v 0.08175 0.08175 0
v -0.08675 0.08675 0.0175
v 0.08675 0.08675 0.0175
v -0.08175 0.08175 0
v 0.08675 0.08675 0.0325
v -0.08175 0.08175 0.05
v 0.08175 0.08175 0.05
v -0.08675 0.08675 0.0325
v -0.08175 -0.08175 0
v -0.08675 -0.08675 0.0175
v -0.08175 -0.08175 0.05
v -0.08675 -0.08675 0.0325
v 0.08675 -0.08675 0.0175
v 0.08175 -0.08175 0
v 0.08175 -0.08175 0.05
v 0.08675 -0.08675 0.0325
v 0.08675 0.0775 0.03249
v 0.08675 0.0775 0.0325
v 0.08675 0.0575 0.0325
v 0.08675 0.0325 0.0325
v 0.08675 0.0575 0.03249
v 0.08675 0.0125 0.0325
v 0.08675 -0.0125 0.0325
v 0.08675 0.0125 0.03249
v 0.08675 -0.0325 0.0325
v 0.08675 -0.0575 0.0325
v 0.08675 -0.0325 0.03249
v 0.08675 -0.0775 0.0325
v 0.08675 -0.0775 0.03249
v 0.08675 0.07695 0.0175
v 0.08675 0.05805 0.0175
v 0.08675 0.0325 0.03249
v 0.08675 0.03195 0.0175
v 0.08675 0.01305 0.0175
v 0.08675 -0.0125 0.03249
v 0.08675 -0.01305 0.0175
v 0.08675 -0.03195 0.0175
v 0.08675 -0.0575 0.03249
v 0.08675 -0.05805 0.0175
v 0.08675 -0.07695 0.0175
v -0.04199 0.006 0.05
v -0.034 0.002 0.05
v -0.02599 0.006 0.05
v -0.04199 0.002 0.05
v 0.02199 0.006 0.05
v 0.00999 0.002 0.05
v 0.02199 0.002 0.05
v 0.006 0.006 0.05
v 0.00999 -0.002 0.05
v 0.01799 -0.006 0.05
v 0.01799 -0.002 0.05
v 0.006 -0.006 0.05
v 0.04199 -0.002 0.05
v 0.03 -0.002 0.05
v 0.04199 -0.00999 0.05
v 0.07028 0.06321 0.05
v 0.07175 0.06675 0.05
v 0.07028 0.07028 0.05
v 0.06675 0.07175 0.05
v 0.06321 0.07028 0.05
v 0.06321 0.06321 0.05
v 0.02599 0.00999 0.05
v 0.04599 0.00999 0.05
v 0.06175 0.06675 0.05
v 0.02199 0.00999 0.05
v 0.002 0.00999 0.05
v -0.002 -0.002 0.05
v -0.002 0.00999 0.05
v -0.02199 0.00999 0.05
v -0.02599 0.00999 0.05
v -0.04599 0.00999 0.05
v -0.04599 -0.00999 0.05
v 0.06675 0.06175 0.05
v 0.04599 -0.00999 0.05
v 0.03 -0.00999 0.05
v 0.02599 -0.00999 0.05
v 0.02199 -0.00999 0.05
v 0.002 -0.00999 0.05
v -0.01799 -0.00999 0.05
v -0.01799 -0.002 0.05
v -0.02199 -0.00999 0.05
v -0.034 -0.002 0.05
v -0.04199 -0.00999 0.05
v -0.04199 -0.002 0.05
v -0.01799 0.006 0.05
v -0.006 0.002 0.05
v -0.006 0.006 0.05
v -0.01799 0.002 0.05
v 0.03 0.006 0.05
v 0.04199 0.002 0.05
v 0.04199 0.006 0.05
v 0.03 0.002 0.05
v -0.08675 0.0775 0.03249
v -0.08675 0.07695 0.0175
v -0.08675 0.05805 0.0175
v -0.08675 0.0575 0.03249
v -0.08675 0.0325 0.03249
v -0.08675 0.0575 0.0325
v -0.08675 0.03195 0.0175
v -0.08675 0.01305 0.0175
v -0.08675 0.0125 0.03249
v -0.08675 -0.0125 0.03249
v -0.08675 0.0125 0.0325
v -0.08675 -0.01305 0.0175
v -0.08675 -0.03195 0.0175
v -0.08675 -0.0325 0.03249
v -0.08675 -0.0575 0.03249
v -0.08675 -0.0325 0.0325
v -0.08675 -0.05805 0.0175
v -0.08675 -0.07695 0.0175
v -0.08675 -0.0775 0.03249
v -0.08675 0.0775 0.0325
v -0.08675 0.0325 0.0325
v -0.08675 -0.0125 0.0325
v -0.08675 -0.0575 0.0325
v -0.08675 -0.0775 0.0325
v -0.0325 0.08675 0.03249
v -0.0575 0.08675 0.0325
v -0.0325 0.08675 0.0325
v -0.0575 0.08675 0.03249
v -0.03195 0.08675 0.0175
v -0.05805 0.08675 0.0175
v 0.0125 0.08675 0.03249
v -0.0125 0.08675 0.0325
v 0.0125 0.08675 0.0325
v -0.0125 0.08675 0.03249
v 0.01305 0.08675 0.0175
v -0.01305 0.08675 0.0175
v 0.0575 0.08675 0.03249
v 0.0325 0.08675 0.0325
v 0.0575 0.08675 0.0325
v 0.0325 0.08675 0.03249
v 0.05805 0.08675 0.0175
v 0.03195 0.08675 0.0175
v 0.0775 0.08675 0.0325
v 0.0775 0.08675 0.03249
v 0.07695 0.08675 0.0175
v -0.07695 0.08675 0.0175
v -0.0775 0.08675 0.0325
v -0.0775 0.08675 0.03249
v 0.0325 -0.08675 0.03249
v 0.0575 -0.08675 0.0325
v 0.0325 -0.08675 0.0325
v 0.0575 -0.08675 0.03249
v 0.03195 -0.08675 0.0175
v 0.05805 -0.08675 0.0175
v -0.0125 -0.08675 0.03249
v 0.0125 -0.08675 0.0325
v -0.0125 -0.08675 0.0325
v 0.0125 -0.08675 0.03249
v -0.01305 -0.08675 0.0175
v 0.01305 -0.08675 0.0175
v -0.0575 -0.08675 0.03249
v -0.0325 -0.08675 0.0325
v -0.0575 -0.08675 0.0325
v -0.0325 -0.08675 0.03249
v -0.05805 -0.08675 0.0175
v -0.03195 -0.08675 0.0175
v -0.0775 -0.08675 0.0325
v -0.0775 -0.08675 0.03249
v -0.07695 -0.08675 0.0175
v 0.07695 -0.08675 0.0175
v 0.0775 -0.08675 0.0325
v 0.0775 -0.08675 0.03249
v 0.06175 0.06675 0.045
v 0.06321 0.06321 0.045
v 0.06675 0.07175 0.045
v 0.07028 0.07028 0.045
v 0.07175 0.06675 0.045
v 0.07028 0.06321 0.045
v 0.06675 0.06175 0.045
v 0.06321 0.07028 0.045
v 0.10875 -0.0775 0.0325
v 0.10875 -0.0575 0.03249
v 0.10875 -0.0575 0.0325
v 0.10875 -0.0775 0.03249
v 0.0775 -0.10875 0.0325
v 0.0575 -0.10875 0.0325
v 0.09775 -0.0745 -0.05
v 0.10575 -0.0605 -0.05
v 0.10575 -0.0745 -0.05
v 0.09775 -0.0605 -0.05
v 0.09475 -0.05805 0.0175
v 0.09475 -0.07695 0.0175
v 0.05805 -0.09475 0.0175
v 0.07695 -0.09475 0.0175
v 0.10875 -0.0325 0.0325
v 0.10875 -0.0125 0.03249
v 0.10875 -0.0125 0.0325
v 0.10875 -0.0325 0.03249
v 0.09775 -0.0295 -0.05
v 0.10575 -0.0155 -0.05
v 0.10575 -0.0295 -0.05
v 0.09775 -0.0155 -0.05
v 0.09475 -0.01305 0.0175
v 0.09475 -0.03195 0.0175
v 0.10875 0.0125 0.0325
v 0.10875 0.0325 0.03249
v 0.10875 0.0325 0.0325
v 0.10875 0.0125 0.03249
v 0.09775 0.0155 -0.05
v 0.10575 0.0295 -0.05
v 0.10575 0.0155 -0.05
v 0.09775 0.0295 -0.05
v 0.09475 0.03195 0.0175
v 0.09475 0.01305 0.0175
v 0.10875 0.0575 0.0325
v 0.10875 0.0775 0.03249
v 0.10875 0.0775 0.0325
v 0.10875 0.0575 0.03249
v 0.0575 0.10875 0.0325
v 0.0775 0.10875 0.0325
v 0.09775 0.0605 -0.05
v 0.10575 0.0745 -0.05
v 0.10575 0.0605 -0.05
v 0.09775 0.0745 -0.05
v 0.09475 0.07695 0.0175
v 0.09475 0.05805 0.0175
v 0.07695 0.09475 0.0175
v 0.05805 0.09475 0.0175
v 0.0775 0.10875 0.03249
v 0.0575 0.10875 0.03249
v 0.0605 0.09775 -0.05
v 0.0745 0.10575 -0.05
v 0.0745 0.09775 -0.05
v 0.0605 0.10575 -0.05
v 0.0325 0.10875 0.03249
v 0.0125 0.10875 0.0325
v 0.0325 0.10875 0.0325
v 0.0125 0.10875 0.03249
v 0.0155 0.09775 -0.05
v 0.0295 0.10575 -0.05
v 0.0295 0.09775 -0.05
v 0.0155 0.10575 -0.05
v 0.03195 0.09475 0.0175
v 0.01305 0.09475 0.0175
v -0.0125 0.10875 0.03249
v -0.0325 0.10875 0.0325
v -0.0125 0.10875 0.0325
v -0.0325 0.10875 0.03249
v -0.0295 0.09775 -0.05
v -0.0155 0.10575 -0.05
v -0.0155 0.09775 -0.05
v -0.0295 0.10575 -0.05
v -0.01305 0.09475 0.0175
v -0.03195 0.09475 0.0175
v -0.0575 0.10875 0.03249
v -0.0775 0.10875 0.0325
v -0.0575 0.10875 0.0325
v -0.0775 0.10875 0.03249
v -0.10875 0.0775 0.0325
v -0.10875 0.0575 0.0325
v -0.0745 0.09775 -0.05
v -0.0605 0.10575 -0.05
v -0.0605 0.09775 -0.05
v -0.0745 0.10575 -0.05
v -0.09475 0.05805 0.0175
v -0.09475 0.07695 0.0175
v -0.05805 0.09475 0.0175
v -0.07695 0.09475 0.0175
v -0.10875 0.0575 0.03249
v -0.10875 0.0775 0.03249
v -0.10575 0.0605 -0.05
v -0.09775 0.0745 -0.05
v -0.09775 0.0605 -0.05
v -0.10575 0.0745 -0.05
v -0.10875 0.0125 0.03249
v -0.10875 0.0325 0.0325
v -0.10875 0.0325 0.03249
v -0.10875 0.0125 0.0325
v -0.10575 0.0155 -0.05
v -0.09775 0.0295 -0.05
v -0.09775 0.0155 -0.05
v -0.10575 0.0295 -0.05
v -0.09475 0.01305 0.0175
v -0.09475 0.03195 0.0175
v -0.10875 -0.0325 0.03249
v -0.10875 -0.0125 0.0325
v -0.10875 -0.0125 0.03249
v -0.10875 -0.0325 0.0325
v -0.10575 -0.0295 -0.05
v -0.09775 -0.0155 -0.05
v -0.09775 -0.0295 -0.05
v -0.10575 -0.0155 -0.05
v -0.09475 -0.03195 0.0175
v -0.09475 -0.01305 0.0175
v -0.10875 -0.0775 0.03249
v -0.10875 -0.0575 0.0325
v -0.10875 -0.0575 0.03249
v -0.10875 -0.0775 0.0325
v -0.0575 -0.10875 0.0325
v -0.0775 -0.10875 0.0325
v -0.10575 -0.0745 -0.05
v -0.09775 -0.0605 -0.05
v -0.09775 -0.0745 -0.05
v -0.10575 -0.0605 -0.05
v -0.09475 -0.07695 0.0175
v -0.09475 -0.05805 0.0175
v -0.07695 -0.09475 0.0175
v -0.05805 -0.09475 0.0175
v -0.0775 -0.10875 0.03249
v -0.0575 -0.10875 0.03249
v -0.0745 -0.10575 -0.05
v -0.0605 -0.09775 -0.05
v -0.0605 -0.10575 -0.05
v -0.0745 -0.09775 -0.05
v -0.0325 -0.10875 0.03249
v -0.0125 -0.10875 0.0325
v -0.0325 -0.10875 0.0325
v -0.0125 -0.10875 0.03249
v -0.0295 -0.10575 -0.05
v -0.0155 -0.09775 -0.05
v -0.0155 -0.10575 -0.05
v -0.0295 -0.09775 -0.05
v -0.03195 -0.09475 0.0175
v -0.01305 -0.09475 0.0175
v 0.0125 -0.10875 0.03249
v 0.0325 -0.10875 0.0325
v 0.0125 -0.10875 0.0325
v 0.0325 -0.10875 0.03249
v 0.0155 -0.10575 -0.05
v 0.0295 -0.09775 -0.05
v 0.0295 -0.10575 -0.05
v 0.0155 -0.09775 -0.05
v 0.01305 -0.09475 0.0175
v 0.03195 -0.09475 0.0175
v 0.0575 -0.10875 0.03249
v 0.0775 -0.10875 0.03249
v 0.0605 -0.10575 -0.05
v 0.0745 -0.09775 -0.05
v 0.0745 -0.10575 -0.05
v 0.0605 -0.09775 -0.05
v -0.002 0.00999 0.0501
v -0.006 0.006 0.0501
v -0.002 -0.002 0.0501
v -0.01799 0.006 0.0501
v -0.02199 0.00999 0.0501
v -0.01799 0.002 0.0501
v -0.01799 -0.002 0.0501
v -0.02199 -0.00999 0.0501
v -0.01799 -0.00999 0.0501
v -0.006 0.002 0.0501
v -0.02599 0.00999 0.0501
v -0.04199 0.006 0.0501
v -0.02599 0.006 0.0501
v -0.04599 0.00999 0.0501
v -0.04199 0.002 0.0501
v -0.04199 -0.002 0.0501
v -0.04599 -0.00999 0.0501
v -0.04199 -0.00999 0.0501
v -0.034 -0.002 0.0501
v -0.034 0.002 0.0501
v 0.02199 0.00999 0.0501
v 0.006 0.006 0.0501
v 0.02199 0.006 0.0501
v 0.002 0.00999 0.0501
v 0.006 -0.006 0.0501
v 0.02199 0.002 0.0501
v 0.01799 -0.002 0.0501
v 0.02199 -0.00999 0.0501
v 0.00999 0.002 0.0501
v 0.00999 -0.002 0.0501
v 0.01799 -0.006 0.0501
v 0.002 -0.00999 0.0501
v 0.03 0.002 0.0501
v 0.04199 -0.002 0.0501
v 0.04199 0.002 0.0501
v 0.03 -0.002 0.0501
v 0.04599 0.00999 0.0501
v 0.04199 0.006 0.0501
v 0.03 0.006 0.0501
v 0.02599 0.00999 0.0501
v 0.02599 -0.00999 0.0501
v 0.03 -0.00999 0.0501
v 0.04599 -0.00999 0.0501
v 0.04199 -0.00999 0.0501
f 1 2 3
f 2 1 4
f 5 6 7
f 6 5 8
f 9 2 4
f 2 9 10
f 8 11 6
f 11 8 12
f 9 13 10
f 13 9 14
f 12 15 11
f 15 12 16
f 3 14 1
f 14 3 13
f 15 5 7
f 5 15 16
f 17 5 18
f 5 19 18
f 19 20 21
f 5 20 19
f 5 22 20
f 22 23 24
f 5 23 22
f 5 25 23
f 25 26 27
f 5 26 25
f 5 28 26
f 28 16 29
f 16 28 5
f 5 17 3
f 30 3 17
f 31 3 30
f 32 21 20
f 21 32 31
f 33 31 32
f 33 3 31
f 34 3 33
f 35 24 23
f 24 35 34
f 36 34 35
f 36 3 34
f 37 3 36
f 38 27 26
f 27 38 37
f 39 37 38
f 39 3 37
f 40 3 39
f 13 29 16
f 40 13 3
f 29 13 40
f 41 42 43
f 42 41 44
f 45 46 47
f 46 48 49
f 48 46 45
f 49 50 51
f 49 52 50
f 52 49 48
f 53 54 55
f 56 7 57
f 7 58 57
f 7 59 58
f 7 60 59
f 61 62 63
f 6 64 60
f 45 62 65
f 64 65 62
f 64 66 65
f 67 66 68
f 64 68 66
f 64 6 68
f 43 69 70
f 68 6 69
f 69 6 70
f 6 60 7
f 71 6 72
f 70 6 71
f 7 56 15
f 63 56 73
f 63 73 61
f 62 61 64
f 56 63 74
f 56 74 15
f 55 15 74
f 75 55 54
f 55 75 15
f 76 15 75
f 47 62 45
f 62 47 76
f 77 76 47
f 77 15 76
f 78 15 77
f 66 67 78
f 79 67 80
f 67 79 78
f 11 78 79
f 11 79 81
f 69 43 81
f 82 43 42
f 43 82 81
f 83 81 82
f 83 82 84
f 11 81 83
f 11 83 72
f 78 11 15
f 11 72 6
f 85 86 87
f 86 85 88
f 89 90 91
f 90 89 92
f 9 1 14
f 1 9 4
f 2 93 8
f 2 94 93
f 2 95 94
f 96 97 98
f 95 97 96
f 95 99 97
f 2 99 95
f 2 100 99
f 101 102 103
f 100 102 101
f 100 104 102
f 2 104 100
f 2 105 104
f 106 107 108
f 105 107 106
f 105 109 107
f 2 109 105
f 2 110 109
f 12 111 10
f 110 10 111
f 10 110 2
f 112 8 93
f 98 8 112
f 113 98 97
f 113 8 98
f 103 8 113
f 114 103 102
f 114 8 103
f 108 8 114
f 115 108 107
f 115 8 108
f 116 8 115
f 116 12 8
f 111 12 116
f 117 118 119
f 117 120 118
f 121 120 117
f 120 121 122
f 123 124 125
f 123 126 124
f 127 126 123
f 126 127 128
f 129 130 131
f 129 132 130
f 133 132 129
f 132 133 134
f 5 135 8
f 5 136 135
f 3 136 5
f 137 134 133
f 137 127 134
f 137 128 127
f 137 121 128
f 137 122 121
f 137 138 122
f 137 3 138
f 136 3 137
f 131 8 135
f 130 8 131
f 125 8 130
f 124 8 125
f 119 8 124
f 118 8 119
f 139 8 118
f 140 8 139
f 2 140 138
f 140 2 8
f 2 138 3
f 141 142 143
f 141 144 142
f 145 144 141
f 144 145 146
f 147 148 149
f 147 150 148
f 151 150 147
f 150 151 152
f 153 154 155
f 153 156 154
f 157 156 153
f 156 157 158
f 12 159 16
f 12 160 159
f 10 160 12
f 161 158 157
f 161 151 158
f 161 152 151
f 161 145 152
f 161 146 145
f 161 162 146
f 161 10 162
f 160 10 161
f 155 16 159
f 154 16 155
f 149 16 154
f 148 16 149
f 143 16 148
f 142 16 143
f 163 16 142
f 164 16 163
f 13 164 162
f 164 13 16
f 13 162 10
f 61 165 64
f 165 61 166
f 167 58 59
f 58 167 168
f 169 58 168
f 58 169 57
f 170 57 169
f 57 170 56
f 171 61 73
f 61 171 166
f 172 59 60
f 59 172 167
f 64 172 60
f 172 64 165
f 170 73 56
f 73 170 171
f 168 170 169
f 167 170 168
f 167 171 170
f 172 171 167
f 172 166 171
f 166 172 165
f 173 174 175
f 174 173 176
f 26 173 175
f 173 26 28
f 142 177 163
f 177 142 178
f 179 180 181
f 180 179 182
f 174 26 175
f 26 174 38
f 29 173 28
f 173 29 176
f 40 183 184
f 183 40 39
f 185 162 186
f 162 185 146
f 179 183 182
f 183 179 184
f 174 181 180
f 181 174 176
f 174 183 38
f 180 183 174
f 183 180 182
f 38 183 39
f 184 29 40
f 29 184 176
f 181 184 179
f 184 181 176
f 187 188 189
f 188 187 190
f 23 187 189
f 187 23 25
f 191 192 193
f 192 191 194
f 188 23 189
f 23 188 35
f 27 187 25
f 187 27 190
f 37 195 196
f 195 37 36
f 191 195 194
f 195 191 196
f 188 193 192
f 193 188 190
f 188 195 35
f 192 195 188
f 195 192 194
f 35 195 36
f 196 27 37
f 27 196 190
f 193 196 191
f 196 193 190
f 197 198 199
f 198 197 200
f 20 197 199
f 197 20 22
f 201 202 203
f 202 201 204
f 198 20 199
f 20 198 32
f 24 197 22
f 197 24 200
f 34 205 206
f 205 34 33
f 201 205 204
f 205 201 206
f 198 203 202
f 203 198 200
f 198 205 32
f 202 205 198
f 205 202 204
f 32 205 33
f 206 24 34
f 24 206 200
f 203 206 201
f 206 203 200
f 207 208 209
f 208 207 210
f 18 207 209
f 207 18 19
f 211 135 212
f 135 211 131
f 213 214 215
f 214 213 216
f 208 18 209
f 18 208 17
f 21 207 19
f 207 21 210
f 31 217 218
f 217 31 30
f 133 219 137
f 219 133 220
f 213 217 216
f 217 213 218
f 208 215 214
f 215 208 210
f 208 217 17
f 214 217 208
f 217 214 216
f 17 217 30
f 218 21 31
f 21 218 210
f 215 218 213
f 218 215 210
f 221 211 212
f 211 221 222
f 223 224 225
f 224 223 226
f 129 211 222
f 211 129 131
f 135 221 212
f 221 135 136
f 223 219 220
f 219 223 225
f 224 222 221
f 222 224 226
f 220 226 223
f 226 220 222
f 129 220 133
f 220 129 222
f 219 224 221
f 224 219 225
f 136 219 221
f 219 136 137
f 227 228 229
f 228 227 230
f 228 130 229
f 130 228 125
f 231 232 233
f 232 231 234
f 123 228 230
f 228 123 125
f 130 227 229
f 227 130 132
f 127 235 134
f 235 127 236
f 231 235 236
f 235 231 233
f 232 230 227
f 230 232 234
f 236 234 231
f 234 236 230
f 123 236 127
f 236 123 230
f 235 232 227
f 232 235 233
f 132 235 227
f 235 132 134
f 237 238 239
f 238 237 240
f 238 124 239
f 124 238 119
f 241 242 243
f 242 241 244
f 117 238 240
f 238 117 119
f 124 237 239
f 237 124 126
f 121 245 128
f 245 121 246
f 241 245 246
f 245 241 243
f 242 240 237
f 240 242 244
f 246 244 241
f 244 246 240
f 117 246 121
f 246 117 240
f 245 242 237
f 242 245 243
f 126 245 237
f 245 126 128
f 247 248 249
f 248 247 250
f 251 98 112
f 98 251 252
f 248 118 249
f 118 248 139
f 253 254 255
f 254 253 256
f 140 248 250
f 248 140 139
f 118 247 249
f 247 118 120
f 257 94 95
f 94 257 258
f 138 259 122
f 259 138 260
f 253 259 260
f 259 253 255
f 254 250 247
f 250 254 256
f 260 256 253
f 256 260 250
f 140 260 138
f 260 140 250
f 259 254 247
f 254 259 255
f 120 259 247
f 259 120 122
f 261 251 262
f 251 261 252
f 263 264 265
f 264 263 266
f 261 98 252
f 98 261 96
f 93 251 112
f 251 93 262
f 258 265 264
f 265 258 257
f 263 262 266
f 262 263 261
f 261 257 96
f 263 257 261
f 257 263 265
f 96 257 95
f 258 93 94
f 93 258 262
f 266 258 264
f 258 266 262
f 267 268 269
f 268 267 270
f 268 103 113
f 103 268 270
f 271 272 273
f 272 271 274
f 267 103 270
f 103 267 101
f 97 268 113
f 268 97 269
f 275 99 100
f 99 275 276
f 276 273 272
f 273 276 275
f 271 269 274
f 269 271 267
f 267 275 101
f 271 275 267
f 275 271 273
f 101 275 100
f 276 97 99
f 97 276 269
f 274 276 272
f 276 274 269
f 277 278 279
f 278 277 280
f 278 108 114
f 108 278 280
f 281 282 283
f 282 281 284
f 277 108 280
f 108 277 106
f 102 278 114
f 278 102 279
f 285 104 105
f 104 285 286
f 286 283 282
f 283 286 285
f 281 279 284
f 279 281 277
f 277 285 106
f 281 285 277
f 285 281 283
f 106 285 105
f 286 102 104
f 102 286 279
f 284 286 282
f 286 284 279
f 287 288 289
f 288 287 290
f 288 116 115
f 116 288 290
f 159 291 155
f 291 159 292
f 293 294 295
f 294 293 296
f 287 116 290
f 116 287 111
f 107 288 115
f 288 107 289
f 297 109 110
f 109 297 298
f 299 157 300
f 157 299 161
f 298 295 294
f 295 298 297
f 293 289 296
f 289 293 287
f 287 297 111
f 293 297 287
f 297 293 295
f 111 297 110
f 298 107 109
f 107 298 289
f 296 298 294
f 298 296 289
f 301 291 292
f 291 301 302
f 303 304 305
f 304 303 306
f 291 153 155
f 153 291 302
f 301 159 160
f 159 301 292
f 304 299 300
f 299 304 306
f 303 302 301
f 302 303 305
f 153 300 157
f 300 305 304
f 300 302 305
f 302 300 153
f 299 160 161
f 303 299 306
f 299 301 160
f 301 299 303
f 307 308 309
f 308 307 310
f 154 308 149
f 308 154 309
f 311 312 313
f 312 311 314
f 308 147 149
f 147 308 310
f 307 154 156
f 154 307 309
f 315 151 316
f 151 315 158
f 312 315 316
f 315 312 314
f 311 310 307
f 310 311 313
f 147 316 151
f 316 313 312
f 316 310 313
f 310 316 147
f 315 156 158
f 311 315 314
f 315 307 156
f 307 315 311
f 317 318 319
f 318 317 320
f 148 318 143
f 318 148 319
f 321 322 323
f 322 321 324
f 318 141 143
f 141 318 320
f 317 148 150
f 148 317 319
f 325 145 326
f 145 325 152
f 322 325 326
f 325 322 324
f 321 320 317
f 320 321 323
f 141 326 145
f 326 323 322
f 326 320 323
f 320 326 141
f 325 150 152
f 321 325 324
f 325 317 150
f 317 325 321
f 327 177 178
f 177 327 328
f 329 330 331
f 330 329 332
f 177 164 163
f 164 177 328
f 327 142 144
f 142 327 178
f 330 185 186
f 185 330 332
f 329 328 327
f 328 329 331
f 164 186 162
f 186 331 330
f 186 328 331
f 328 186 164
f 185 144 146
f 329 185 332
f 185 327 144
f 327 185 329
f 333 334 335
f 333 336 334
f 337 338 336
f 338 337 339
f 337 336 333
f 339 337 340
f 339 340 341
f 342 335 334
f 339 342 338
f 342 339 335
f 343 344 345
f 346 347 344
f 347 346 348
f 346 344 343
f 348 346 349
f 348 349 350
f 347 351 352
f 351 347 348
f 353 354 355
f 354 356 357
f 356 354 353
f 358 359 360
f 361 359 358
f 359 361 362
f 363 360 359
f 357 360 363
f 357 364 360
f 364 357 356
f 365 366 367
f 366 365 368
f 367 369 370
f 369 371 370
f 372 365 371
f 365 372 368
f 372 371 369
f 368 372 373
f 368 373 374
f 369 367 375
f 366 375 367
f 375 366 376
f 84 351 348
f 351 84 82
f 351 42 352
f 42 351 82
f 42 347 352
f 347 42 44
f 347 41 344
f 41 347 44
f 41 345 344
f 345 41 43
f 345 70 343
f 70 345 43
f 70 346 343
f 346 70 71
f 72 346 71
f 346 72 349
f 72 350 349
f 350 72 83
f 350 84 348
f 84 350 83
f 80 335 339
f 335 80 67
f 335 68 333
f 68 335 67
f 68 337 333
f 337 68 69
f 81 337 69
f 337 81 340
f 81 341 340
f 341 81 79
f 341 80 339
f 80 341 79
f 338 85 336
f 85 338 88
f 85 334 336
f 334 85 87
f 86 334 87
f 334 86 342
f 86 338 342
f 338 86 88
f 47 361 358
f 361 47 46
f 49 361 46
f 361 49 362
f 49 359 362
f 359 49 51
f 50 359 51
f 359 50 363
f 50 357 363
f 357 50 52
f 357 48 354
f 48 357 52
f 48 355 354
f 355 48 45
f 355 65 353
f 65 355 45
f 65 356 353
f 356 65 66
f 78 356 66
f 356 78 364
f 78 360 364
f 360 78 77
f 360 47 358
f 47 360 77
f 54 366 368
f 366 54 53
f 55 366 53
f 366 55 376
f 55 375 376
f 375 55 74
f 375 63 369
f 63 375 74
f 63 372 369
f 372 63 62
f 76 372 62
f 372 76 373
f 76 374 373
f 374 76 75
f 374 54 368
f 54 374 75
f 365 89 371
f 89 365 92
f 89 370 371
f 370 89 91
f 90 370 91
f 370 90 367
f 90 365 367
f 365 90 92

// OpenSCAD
// file: FPGAHousing_base.scad
include <FPGA_shared.scad>;
use <FPGAHousing_paintcap.scad>;
use <PowerSymbol.scad>;
use <DataSymbol.scad>;

module FPGAHousing_chipcutout() {
  slotPinBaseOffset = (-slotPinEdgeCount-1)/2 * slotPinEdgeSpacing;
  slotPinEdgeOffset = slotSize/2 - slotPinSize/2 - slotPinEdgePad;
  union() {
    translate([0, 0, baseDepth/2 + slotBottom + slotPinDepth]) {
      cube(size=[slotSize, slotSize, baseDepth], center=true);
    }
    for(edge=[1:4]) rotate([0,0,90*edge]) {
      for(i=[1:slotPinEdgeCount]) {
        translate([
          slotPinBaseOffset + slotPinEdgeSpacing*i,
          slotPinEdgeOffset,
          slotBottom + slotPinDepth
        ]) {
          cube(size=[slotPinSize, slotPinSize, slotPinDepth*2], center=true);
        }
      }
    }
    translate([alignHoleOffset,alignHoleOffset,slotBottom + slotPinDepth])
      cylinder(h=alignHoleDepth*2, r=alignHoleRadius, center=true, $fn=alignHoleSides);
  }
}

module FPGAHousing_base() {
  middleSize = (slotSize + capSize) / 2;
  difference() {
    union() {
      translate([0,0,baseCenter])
        cube(size=[baseSize, baseSize, baseDepth], center=true);
      translate([0,0,baseTop-eps])
        cube(size=[middleSize, middleSize, capDepth*2], center=true);
    }
    translate([0,0,baseBottom])
      cube(size=[baseBackCutoutSize, baseBackCutoutSize, baseBackCutoutDepth*2], center=true);
    FPGAHousing_chipcutout();
  }
}

FPGAHousing_base();
%FPGAHousing_paintcap();
// file: Text_FPGALOGIC.scad
include <Text_shared.scad>;

module Text_FPGALOGIC() {
  Text("FPGA LOGIC");
}

Text_FPGALOGIC();
// file: DataSymbol.scad
boxSize = 0.029;
lineSize = 0.0045;
symDepth = 0.01;
vertSeparation = 0.019;
horizSeparation = 0.018;

module DataSymbol() {
  boxVertCenter = (boxSize+vertSeparation)/2;
  boxHorizCenter = (boxSize+horizSeparation)/2;
  linear_extrude(symDepth, center=true) {
    translate([0,boxVertCenter]) square(boxSize, center=true); // top box
    translate([-boxHorizCenter,-boxVertCenter]) square(boxSize, center=true); // bottom left box
    translate([boxHorizCenter,-boxVertCenter]) square(boxSize, center=true); // bottom right box
    square([2*boxHorizCenter + lineSize, lineSize], center=true); // middle line
    translate([0, horizSeparation/4]) square([lineSize, horizSeparation/2 + lineSize], center=true); // line to top
    translate([-boxHorizCenter, -horizSeparation/4]) square([lineSize, horizSeparation/2 + lineSize], center=true); // line to bottom left
    translate([boxHorizCenter, -horizSeparation/4]) square([lineSize, horizSeparation/2 + lineSize], center=true); // line to bottom right
  }
}

DataSymbol();
// file: PowerSymbol.scad
symWidth = 0.038;
symHeight = 0.086;
symDepth = 0.01;
middleHeight = 0.0075;
topHorizOffset = 0.007;
sideVertOffset = 0.007;

module PowerSymbol() {
  linear_extrude(symDepth, center=true) {
    halfHei = symHeight/2;
    halfWid = symWidth/2;
    halfMid = middleHeight/2;
    polygon([
      [topHorizOffset, halfHei],
      [0, halfMid],
      [halfWid, sideVertOffset],
      [-topHorizOffset, -halfHei],
      [0, -halfMid],
      [-halfWid, -sideVertOffset]
    ]);
  }
}

PowerSymbol();
// file: FPGAHousing_pins.scad
include <FPGA_shared.scad>;
use <FPGAHousing_base.scad>;
use <FPGAHousing_paintcap.scad>;

module FPGAHousing_pins() {
  pinStartOffset = -(decoPinCount+1)/2 * decoPinSpacing;
  bevelSize = decoPinBevelSize * sqrt(2);

  for (edge=[0:3]) rotate([0,0,90*edge]) {
    for (pin=[1:decoPinCount]) translate([capSize/2, pinStartOffset+pin*decoPinSpacing, baseTop]) {
      difference() {
        cube(size=[decoPinLength*2, decoPinWidth, decoPinHeight*2], center=true);
        translate([decoPinLength,0,decoPinHeight]) rotate([0,45,0]) {
          cube(size=[bevelSize,decoPinWidth*2,bevelSize],center=true);
        }
      }
    }
  }
}

FPGAHousing_pins();
%FPGAHousing_base();
%FPGAHousing_paintcap();
// file: FPGAHousing_paintcap.scad
include <FPGA_shared.scad>;
use <FPGAHousing_base.scad>;

module FPGAHousing_paintcap() {
  bevelDepth = capBevel * sqrt(2);
  difference() {
    translate([0,0,baseTop]) {
      cube(size=[capSize, capSize, capDepth*2], center=true);
    }
    cube(size=[slotSize+eps*10, slotSize+eps*10, smallGridSize], center=true);
    for (edge=[1:4]) rotate([0,0,90*edge]) {
      translate([0,capSize/2,baseTop+capDepth]) rotate([45,0,0])
        cube(size=[capSize+0.1, bevelDepth, bevelDepth*2], center=true);
    }
  }
}

%FPGAHousing_base();
FPGAHousing_paintcap();
// file: FPGAHousing_logicbase.scad
include <FPGA_shared.scad>;
use <FPGAHousing_base.scad>;
use <FPGAHousing_paintcap.scad>;
use <PowerSymbol.scad>;
use <DataSymbol.scad>;

module FPGAHousing_logicbase() {
  difference() {
    FPGAHousing_base();
    cablecutout();
    rotate([0,0,180]) cablecutout();
  }
}

FPGAHousing_logicbase();
%FPGAHousing_paintcap();
%translate([0.067,0.25,-0.001]) rotate([-90, 0, 0]) PowerSymbol();
%translate([0.073,-0.25,0.001]) rotate([90, 0, 0]) DataSymbol();
// file: Text_shared.scad
char_depth = 0.0001;

char_pixelsz = 0.02/5;
char_pheight = 5;
char_max_pwidth = 5;

function sum(list) = list * [for (_=list) 1];
function partialsum(list, end) = list * [for (i=[0:len(list)-1]) i < end ? 1 : 0];

module _Text_Line(a, b) {
  l = norm(b-a);
  f = l > 0 ? (b-a)/l : [1, 0];
  r = [f.y, -f.x];
  ea = -0.5*f;
  eb = (l+0.5)*f;
  sr = 0.5*r;
  sl = -sr;
  polygon([
    a+ea+sr,
    a+eb+sr,
    a+eb+sl,
    a+ea+sl,
  ]*char_pixelsz);
}

module _Text_Segments(pts, off=[0,0]) {
  for (i=[0:len(pts)-2]) {
    pa = pts[i];
    pb = pts[i+1];
    if (len(pa) == 2 && len(pb) == 2)
      _Text_Line(pts[i]+off, pts[i+1]+off);
  }
}

_Letters = [
  [[-2, -2], [-2, 2], [2, 2], [2, -2], [2, 0], [-2, 0]], // A
  [], // B
  [[2, -2], [-2, -2], [-2, 2], [2, 2]], // C
  [[2, 0.5], [2, -2], [-2, -2], [-2, 2], [0.5, 2], [], [3, 0], [0, 3]], // D
  [[2, -2], [-2, -2], [-2, 2], [2, 2], [], [-2, 0], [0, 0]], // E
  [[2, 2], [-2, 2], [-2, -2], [-2, 0], [0, 0]], // F
  [[0, 0], [2, 0], [2, -2], [-2, -2], [-2, 2], [2, 2]], // G
  [], // H
  [[0, -2], [0, 2]], // I
  [], // J
  [], // K
  [[-2, 2], [-2, -2], [2, -2]], // L
  [], // M
  [], // N
  [[-2, -2], [-2, 2], [2, 2], [2, -2], [-2, -2]], // O
  [[-2, -2], [-2, 2], [2, 2], [2, 0], [-2, 0]], // P
  [], // Q
  [[-2, -2], [-2, 2], [2, 2], [2, 0], [-2, 0], [1, -3]], // R
  [], // S
  [], // T
  [], // U
  [], // V
  [], // W
  [], // X
  [], // Y
  [], // Z
  [[-2, 2], [2, 2], [2, 0], [0, 0], [], [0, -2], [0, -2]], // ? for missing
];

function _Letter_Lookup(c) =
  let(
    ci=ord(c),
    li=ci-ord("A"),
    issp=ci==32,
    lps=li>=0&&li<26 ? _Letters[li] : [],
    lpf=len(lps)==0 ? _Letters[26] : lps
  ) issp ? [] : lpf;

function _Letter_Bounds(letter) =
  let(
    fletter = concat([[0, 0]], [for (l=letter) len(l)==2 ? l : [0,0]]),
    xs = [for (l=fletter) l.x],
    ys = [for (l=fletter) l.y]
  ) [min(xs), min(ys), max(xs), max(ys)];

module Text(letters) {
  lbounds = [for (l=letters) _Letter_Bounds(l)];
  lwidths = [for (b=lbounds) min(b.z-b.x+1, char_max_pwidth)];
  lmins = [for (b=lbounds) b.x];
  twid = sum(lwidths) + len(letters)-1;
  startoff = (1-twid)/2;
  offs = [for (i=[0:len(letters)-1]) startoff+i+partialsum(lwidths, i)];
  linear_extrude(height=char_depth) {
    for (i=[0:len(letters)-1]) if (len(letters[i]) > 0) {
      letter = letters[i];
      off = offs[i];
      left = off-lmins[i];
      wid = lwidths[i];
      intersection() {
        _Text_Segments(letter, [left, 0]);
        scale([char_pixelsz,char_pixelsz]) translate([off-0.5, -char_pheight/2])
          square(size=[wid, char_pheight]);
      }
    }
  }
}

module Text(text) {
  letters = [for (c=text) _Letter_Lookup(c)];
  lbounds = [for (l=letters) _Letter_Bounds(l)];
  lwidths = [for (b=lbounds) min(b.z-b.x+1, char_max_pwidth)];
  lmins = [for (b=lbounds) b.x];
  twid = sum(lwidths) + len(letters)-1;
  startoff = (1-twid)/2;
  offs = [for (i=[0:len(letters)-1]) startoff+i+partialsum(lwidths, i)];
  linear_extrude(height=char_depth) {
    for (i=[0:len(letters)-1]) if (len(letters[i]) > 0) {
      letter = letters[i];
      off = offs[i];
      left = off-lmins[i];
      wid = lwidths[i];
      intersection() {
        _Text_Segments(letter, [left, 0]);
        scale([char_pixelsz,char_pixelsz]) translate([off-0.5, -char_pheight/2])
          square(size=[wid, char_pheight]);
      }
    }
  }
}
// file: FPGAHousing_logicfull.scad
use <FPGAHousing_logicbase.scad>;
use <FPGAHousing_paintcap.scad>;
use <FPGAHousing_pins.scad>;
use <PowerSymbol.scad>;
use <DataSymbol.scad>;
use <Text_FPGALOGIC.scad>;

module FPGAHousing_logicfull() {
  color("#444") FPGAHousing_logicbase();
  color("#444") FPGAHousing_paintcap();
  color("#FFF") FPGAHousing_pins();
  color("#F00") translate([0.067,0.25,-0.001]) rotate([-90, 0, 0]) PowerSymbol();
  color("#0F0") translate([0.073,-0.25,0.001]) rotate([90, 0, 0]) DataSymbol();
  color("#FFF") translate([0,0.16,0.095]) Text_FPGALOGIC();
}

FPGAHousing_logicfull();
// file: Text_FPGA.scad
include <Text_shared.scad>;

module Text_FPGA() {
  Text("FPGA");
}

Text_FPGA();
// file: FPGAChip_pins.scad
include <FPGA_shared.scad>;
use <FPGAChip_base.scad>;

module FPGAPin() {
  pinTop = chipTotalHeight/2 - chipBaseHeight/2 + pinHorizHeight/2;
  pinVCenter = pinTop - pinTotalHeight/2;
  pinBottomInnerEdge = pinHorizUnderLength + pinVertInnerOffset;
  pinInnerHeight = pinTotalHeight - pinHorizHeight;
  pinInnerAngle = atan2(-pinVertInnerOffset, pinInnerHeight);
  pinInnerCutoutHeight = pinInnerHeight / cos(pinInnerAngle);
  pinBottomOuterEdge = pinHorizLength - pinVertOuterOffset;
  pinOuterAngle = atan2(pinVertOuterOffset, pinTotalHeight);
  pinBottomNarrowEdge = pinHorizWidth/2 - pinVertNarrowOffset;
  pinNarrowAngle = atan2(pinVertNarrowOffset, pinTotalHeight);
  translate([0,0,pinVCenter]) difference() {
    translate([0, 0, 0])
      cube(size=[pinHorizLength*2, pinHorizWidth, pinTotalHeight], center=true);
    translate([pinHorizUnderLength-pinHorizLength, 0, -pinHorizHeight])
      cube(size=[pinHorizLength*2, pinHorizWidth*2, pinTotalHeight], center=true);
    translate([pinBottomInnerEdge,0,-pinHorizHeight/2-pinInnerHeight/2])
      rotate([0,pinInnerAngle,0])
      translate([-pinVertInnerOffset,0,0])
        cube(size=[pinVertInnerOffset*2, pinHorizWidth*2, pinInnerCutoutHeight*2], center=true);
    translate([pinBottomOuterEdge,0,-pinTotalHeight/2])
      rotate([0,pinOuterAngle,0])
      translate([pinVertOuterOffset,0,0])
        cube(size=[pinVertOuterOffset*2, pinHorizWidth*2, pinTotalHeight*4], center=true);
    translate([0,pinBottomNarrowEdge,-pinTotalHeight/2])
      rotate([-pinNarrowAngle,0,0])
      translate([0,pinVertNarrowOffset,0])
        cube(size=[pinHorizLength*4,pinVertNarrowOffset*2, pinTotalHeight*4], center=true);
    translate([0,-pinBottomNarrowEdge,-pinTotalHeight/2])
      rotate([pinNarrowAngle,0,0])
      translate([0,-pinVertNarrowOffset,0])
        cube(size=[pinHorizLength*4,pinVertNarrowOffset*2, pinTotalHeight*4], center=true);
  }
}

module FPGAChip_pins() {
  for (edge=[0:3])
    for (off=[1:slotPinEdgeCount])
      rotate([0,0,90*edge])
        translate([chipBaseSize/2, slotPinEdgeSpacing * (off - (slotPinEdgeCount+1)/2), 0])
        FPGAPin();
}

FPGAChip_pins();
%FPGAChip_base();
// file: FPGAChip_base.scad
include <FPGA_shared.scad>;
use <FPGAHousing_logicfull.scad>;
use <FPGAChip_pins.scad>;
use <Text_FPGA.scad>;

module FPGAChip_base() {
  bevelHeight = (chipBaseHeight - pinHorizHeight)/2;
  bevelAngle = atan2(chipBaseBevelSize, bevelHeight);
  translate([0, 0, chipTotalHeight/2 - chipBaseHeight/2]) difference() {
    cube(size=[chipBaseSize, chipBaseSize, chipBaseHeight], center=true);
    for (side=[0:3]) rotate([0,0,90*side])
      for (vside = [-1:2:1])
        translate([0,chipBaseSize/2,vside*pinHorizHeight/2])
          rotate([vside*bevelAngle,0,0])
          translate([0,chipBaseBevelSize,0])
            cube(size=[chipBaseSize*2,chipBaseBevelSize*2,bevelHeight*4], center=true);
    translate([alignHoleOffset,alignHoleOffset,chipBaseHeight/2])
      cylinder(h=alignHoleDepth*2, r=alignHoleRadius, center=true, $fn=alignHoleSides);
  }
}

FPGAChip_base();
%FPGAChip_pins();
%translate([0,0,0.05]) Text_FPGA();
*%translate([0,0,-slotBottom-chipTotalHeight/2]) FPGAHousing_logicfull();
// file: FPGA_shared.scad
smallGridSize = 0.5;
baseSize = smallGridSize;
baseTop = 0.05;
baseBottom = -0.045;
baseDepth = baseTop - baseBottom;
baseCenter = (baseTop + baseBottom)/2;
baseBackRim = 0.02;
baseBackCutoutSize = baseSize - baseBackRim*2;
baseBackCutoutDepth = 0.01;
capSize = 0.41;
capDepth = 0.045;
capBevel = 0.01;
slotSize = smallGridSize * 0.5;
slotBottom = 0.03;
slotPinEdgeCount = 4;
slotPinEdgePad = 0.01;
slotPinEdgeSpacing = 0.045;
slotPinSize = 0.025;
slotPinDepth = 0.025;
eps = 0.00001;
chipTotalSize = slotSize - slotPinEdgePad*2 - slotPinSize/2;
chipTotalHeight = 0.1;
chipBaseHeight = 0.05;
pinHorizLength = 0.022;
pinHorizUnderLength = 0.008;
pinHorizWidth = 0.02;
pinHorizHeight = 0.015;
pinVertInnerOffset = 0.003;
pinVertOuterOffset = 0.003;
pinVertNarrowOffset = 0.003;
pinTotalHeight = chipTotalHeight - chipBaseHeight/2 + pinHorizHeight/2;
chipBaseSize = chipTotalSize - pinHorizLength*2;
chipBaseBevelSize = 0.005;
alignHoleRadius = 0.005;
alignHoleOffset = chipBaseSize/2 - 0.02;
alignHoleDepth = 0.005;
alignHoleSides = 8;
decoPinCount = 8;
decoPinWidth = 0.036;
decoPinLength = 0.034;
decoPinHeight = 0.028;
decoPinSpacing = 0.049;
decoPinBevelSize = 0.010;

module cablecutout() {
  cableradius = 0.025;
  cableDepth = 0.0125;
  translate([0,smallGridSize/2,0]) rotate([90,0,0]) {
    cylinder(h=cableDepth*2, r=cableradius, center=true, $fn=8);
  }
}
// main file
include <FPGA_shared.scad>;
use <FPGAChip_base.scad>;
use <FPGAChip_pins.scad>;
use <Text_FPGA.scad>;

color("#111") FPGAChip_base();
color("#DDD") FPGAChip_pins();
color("#FFF") translate([0,0,0.05]) Text_FPGA();
